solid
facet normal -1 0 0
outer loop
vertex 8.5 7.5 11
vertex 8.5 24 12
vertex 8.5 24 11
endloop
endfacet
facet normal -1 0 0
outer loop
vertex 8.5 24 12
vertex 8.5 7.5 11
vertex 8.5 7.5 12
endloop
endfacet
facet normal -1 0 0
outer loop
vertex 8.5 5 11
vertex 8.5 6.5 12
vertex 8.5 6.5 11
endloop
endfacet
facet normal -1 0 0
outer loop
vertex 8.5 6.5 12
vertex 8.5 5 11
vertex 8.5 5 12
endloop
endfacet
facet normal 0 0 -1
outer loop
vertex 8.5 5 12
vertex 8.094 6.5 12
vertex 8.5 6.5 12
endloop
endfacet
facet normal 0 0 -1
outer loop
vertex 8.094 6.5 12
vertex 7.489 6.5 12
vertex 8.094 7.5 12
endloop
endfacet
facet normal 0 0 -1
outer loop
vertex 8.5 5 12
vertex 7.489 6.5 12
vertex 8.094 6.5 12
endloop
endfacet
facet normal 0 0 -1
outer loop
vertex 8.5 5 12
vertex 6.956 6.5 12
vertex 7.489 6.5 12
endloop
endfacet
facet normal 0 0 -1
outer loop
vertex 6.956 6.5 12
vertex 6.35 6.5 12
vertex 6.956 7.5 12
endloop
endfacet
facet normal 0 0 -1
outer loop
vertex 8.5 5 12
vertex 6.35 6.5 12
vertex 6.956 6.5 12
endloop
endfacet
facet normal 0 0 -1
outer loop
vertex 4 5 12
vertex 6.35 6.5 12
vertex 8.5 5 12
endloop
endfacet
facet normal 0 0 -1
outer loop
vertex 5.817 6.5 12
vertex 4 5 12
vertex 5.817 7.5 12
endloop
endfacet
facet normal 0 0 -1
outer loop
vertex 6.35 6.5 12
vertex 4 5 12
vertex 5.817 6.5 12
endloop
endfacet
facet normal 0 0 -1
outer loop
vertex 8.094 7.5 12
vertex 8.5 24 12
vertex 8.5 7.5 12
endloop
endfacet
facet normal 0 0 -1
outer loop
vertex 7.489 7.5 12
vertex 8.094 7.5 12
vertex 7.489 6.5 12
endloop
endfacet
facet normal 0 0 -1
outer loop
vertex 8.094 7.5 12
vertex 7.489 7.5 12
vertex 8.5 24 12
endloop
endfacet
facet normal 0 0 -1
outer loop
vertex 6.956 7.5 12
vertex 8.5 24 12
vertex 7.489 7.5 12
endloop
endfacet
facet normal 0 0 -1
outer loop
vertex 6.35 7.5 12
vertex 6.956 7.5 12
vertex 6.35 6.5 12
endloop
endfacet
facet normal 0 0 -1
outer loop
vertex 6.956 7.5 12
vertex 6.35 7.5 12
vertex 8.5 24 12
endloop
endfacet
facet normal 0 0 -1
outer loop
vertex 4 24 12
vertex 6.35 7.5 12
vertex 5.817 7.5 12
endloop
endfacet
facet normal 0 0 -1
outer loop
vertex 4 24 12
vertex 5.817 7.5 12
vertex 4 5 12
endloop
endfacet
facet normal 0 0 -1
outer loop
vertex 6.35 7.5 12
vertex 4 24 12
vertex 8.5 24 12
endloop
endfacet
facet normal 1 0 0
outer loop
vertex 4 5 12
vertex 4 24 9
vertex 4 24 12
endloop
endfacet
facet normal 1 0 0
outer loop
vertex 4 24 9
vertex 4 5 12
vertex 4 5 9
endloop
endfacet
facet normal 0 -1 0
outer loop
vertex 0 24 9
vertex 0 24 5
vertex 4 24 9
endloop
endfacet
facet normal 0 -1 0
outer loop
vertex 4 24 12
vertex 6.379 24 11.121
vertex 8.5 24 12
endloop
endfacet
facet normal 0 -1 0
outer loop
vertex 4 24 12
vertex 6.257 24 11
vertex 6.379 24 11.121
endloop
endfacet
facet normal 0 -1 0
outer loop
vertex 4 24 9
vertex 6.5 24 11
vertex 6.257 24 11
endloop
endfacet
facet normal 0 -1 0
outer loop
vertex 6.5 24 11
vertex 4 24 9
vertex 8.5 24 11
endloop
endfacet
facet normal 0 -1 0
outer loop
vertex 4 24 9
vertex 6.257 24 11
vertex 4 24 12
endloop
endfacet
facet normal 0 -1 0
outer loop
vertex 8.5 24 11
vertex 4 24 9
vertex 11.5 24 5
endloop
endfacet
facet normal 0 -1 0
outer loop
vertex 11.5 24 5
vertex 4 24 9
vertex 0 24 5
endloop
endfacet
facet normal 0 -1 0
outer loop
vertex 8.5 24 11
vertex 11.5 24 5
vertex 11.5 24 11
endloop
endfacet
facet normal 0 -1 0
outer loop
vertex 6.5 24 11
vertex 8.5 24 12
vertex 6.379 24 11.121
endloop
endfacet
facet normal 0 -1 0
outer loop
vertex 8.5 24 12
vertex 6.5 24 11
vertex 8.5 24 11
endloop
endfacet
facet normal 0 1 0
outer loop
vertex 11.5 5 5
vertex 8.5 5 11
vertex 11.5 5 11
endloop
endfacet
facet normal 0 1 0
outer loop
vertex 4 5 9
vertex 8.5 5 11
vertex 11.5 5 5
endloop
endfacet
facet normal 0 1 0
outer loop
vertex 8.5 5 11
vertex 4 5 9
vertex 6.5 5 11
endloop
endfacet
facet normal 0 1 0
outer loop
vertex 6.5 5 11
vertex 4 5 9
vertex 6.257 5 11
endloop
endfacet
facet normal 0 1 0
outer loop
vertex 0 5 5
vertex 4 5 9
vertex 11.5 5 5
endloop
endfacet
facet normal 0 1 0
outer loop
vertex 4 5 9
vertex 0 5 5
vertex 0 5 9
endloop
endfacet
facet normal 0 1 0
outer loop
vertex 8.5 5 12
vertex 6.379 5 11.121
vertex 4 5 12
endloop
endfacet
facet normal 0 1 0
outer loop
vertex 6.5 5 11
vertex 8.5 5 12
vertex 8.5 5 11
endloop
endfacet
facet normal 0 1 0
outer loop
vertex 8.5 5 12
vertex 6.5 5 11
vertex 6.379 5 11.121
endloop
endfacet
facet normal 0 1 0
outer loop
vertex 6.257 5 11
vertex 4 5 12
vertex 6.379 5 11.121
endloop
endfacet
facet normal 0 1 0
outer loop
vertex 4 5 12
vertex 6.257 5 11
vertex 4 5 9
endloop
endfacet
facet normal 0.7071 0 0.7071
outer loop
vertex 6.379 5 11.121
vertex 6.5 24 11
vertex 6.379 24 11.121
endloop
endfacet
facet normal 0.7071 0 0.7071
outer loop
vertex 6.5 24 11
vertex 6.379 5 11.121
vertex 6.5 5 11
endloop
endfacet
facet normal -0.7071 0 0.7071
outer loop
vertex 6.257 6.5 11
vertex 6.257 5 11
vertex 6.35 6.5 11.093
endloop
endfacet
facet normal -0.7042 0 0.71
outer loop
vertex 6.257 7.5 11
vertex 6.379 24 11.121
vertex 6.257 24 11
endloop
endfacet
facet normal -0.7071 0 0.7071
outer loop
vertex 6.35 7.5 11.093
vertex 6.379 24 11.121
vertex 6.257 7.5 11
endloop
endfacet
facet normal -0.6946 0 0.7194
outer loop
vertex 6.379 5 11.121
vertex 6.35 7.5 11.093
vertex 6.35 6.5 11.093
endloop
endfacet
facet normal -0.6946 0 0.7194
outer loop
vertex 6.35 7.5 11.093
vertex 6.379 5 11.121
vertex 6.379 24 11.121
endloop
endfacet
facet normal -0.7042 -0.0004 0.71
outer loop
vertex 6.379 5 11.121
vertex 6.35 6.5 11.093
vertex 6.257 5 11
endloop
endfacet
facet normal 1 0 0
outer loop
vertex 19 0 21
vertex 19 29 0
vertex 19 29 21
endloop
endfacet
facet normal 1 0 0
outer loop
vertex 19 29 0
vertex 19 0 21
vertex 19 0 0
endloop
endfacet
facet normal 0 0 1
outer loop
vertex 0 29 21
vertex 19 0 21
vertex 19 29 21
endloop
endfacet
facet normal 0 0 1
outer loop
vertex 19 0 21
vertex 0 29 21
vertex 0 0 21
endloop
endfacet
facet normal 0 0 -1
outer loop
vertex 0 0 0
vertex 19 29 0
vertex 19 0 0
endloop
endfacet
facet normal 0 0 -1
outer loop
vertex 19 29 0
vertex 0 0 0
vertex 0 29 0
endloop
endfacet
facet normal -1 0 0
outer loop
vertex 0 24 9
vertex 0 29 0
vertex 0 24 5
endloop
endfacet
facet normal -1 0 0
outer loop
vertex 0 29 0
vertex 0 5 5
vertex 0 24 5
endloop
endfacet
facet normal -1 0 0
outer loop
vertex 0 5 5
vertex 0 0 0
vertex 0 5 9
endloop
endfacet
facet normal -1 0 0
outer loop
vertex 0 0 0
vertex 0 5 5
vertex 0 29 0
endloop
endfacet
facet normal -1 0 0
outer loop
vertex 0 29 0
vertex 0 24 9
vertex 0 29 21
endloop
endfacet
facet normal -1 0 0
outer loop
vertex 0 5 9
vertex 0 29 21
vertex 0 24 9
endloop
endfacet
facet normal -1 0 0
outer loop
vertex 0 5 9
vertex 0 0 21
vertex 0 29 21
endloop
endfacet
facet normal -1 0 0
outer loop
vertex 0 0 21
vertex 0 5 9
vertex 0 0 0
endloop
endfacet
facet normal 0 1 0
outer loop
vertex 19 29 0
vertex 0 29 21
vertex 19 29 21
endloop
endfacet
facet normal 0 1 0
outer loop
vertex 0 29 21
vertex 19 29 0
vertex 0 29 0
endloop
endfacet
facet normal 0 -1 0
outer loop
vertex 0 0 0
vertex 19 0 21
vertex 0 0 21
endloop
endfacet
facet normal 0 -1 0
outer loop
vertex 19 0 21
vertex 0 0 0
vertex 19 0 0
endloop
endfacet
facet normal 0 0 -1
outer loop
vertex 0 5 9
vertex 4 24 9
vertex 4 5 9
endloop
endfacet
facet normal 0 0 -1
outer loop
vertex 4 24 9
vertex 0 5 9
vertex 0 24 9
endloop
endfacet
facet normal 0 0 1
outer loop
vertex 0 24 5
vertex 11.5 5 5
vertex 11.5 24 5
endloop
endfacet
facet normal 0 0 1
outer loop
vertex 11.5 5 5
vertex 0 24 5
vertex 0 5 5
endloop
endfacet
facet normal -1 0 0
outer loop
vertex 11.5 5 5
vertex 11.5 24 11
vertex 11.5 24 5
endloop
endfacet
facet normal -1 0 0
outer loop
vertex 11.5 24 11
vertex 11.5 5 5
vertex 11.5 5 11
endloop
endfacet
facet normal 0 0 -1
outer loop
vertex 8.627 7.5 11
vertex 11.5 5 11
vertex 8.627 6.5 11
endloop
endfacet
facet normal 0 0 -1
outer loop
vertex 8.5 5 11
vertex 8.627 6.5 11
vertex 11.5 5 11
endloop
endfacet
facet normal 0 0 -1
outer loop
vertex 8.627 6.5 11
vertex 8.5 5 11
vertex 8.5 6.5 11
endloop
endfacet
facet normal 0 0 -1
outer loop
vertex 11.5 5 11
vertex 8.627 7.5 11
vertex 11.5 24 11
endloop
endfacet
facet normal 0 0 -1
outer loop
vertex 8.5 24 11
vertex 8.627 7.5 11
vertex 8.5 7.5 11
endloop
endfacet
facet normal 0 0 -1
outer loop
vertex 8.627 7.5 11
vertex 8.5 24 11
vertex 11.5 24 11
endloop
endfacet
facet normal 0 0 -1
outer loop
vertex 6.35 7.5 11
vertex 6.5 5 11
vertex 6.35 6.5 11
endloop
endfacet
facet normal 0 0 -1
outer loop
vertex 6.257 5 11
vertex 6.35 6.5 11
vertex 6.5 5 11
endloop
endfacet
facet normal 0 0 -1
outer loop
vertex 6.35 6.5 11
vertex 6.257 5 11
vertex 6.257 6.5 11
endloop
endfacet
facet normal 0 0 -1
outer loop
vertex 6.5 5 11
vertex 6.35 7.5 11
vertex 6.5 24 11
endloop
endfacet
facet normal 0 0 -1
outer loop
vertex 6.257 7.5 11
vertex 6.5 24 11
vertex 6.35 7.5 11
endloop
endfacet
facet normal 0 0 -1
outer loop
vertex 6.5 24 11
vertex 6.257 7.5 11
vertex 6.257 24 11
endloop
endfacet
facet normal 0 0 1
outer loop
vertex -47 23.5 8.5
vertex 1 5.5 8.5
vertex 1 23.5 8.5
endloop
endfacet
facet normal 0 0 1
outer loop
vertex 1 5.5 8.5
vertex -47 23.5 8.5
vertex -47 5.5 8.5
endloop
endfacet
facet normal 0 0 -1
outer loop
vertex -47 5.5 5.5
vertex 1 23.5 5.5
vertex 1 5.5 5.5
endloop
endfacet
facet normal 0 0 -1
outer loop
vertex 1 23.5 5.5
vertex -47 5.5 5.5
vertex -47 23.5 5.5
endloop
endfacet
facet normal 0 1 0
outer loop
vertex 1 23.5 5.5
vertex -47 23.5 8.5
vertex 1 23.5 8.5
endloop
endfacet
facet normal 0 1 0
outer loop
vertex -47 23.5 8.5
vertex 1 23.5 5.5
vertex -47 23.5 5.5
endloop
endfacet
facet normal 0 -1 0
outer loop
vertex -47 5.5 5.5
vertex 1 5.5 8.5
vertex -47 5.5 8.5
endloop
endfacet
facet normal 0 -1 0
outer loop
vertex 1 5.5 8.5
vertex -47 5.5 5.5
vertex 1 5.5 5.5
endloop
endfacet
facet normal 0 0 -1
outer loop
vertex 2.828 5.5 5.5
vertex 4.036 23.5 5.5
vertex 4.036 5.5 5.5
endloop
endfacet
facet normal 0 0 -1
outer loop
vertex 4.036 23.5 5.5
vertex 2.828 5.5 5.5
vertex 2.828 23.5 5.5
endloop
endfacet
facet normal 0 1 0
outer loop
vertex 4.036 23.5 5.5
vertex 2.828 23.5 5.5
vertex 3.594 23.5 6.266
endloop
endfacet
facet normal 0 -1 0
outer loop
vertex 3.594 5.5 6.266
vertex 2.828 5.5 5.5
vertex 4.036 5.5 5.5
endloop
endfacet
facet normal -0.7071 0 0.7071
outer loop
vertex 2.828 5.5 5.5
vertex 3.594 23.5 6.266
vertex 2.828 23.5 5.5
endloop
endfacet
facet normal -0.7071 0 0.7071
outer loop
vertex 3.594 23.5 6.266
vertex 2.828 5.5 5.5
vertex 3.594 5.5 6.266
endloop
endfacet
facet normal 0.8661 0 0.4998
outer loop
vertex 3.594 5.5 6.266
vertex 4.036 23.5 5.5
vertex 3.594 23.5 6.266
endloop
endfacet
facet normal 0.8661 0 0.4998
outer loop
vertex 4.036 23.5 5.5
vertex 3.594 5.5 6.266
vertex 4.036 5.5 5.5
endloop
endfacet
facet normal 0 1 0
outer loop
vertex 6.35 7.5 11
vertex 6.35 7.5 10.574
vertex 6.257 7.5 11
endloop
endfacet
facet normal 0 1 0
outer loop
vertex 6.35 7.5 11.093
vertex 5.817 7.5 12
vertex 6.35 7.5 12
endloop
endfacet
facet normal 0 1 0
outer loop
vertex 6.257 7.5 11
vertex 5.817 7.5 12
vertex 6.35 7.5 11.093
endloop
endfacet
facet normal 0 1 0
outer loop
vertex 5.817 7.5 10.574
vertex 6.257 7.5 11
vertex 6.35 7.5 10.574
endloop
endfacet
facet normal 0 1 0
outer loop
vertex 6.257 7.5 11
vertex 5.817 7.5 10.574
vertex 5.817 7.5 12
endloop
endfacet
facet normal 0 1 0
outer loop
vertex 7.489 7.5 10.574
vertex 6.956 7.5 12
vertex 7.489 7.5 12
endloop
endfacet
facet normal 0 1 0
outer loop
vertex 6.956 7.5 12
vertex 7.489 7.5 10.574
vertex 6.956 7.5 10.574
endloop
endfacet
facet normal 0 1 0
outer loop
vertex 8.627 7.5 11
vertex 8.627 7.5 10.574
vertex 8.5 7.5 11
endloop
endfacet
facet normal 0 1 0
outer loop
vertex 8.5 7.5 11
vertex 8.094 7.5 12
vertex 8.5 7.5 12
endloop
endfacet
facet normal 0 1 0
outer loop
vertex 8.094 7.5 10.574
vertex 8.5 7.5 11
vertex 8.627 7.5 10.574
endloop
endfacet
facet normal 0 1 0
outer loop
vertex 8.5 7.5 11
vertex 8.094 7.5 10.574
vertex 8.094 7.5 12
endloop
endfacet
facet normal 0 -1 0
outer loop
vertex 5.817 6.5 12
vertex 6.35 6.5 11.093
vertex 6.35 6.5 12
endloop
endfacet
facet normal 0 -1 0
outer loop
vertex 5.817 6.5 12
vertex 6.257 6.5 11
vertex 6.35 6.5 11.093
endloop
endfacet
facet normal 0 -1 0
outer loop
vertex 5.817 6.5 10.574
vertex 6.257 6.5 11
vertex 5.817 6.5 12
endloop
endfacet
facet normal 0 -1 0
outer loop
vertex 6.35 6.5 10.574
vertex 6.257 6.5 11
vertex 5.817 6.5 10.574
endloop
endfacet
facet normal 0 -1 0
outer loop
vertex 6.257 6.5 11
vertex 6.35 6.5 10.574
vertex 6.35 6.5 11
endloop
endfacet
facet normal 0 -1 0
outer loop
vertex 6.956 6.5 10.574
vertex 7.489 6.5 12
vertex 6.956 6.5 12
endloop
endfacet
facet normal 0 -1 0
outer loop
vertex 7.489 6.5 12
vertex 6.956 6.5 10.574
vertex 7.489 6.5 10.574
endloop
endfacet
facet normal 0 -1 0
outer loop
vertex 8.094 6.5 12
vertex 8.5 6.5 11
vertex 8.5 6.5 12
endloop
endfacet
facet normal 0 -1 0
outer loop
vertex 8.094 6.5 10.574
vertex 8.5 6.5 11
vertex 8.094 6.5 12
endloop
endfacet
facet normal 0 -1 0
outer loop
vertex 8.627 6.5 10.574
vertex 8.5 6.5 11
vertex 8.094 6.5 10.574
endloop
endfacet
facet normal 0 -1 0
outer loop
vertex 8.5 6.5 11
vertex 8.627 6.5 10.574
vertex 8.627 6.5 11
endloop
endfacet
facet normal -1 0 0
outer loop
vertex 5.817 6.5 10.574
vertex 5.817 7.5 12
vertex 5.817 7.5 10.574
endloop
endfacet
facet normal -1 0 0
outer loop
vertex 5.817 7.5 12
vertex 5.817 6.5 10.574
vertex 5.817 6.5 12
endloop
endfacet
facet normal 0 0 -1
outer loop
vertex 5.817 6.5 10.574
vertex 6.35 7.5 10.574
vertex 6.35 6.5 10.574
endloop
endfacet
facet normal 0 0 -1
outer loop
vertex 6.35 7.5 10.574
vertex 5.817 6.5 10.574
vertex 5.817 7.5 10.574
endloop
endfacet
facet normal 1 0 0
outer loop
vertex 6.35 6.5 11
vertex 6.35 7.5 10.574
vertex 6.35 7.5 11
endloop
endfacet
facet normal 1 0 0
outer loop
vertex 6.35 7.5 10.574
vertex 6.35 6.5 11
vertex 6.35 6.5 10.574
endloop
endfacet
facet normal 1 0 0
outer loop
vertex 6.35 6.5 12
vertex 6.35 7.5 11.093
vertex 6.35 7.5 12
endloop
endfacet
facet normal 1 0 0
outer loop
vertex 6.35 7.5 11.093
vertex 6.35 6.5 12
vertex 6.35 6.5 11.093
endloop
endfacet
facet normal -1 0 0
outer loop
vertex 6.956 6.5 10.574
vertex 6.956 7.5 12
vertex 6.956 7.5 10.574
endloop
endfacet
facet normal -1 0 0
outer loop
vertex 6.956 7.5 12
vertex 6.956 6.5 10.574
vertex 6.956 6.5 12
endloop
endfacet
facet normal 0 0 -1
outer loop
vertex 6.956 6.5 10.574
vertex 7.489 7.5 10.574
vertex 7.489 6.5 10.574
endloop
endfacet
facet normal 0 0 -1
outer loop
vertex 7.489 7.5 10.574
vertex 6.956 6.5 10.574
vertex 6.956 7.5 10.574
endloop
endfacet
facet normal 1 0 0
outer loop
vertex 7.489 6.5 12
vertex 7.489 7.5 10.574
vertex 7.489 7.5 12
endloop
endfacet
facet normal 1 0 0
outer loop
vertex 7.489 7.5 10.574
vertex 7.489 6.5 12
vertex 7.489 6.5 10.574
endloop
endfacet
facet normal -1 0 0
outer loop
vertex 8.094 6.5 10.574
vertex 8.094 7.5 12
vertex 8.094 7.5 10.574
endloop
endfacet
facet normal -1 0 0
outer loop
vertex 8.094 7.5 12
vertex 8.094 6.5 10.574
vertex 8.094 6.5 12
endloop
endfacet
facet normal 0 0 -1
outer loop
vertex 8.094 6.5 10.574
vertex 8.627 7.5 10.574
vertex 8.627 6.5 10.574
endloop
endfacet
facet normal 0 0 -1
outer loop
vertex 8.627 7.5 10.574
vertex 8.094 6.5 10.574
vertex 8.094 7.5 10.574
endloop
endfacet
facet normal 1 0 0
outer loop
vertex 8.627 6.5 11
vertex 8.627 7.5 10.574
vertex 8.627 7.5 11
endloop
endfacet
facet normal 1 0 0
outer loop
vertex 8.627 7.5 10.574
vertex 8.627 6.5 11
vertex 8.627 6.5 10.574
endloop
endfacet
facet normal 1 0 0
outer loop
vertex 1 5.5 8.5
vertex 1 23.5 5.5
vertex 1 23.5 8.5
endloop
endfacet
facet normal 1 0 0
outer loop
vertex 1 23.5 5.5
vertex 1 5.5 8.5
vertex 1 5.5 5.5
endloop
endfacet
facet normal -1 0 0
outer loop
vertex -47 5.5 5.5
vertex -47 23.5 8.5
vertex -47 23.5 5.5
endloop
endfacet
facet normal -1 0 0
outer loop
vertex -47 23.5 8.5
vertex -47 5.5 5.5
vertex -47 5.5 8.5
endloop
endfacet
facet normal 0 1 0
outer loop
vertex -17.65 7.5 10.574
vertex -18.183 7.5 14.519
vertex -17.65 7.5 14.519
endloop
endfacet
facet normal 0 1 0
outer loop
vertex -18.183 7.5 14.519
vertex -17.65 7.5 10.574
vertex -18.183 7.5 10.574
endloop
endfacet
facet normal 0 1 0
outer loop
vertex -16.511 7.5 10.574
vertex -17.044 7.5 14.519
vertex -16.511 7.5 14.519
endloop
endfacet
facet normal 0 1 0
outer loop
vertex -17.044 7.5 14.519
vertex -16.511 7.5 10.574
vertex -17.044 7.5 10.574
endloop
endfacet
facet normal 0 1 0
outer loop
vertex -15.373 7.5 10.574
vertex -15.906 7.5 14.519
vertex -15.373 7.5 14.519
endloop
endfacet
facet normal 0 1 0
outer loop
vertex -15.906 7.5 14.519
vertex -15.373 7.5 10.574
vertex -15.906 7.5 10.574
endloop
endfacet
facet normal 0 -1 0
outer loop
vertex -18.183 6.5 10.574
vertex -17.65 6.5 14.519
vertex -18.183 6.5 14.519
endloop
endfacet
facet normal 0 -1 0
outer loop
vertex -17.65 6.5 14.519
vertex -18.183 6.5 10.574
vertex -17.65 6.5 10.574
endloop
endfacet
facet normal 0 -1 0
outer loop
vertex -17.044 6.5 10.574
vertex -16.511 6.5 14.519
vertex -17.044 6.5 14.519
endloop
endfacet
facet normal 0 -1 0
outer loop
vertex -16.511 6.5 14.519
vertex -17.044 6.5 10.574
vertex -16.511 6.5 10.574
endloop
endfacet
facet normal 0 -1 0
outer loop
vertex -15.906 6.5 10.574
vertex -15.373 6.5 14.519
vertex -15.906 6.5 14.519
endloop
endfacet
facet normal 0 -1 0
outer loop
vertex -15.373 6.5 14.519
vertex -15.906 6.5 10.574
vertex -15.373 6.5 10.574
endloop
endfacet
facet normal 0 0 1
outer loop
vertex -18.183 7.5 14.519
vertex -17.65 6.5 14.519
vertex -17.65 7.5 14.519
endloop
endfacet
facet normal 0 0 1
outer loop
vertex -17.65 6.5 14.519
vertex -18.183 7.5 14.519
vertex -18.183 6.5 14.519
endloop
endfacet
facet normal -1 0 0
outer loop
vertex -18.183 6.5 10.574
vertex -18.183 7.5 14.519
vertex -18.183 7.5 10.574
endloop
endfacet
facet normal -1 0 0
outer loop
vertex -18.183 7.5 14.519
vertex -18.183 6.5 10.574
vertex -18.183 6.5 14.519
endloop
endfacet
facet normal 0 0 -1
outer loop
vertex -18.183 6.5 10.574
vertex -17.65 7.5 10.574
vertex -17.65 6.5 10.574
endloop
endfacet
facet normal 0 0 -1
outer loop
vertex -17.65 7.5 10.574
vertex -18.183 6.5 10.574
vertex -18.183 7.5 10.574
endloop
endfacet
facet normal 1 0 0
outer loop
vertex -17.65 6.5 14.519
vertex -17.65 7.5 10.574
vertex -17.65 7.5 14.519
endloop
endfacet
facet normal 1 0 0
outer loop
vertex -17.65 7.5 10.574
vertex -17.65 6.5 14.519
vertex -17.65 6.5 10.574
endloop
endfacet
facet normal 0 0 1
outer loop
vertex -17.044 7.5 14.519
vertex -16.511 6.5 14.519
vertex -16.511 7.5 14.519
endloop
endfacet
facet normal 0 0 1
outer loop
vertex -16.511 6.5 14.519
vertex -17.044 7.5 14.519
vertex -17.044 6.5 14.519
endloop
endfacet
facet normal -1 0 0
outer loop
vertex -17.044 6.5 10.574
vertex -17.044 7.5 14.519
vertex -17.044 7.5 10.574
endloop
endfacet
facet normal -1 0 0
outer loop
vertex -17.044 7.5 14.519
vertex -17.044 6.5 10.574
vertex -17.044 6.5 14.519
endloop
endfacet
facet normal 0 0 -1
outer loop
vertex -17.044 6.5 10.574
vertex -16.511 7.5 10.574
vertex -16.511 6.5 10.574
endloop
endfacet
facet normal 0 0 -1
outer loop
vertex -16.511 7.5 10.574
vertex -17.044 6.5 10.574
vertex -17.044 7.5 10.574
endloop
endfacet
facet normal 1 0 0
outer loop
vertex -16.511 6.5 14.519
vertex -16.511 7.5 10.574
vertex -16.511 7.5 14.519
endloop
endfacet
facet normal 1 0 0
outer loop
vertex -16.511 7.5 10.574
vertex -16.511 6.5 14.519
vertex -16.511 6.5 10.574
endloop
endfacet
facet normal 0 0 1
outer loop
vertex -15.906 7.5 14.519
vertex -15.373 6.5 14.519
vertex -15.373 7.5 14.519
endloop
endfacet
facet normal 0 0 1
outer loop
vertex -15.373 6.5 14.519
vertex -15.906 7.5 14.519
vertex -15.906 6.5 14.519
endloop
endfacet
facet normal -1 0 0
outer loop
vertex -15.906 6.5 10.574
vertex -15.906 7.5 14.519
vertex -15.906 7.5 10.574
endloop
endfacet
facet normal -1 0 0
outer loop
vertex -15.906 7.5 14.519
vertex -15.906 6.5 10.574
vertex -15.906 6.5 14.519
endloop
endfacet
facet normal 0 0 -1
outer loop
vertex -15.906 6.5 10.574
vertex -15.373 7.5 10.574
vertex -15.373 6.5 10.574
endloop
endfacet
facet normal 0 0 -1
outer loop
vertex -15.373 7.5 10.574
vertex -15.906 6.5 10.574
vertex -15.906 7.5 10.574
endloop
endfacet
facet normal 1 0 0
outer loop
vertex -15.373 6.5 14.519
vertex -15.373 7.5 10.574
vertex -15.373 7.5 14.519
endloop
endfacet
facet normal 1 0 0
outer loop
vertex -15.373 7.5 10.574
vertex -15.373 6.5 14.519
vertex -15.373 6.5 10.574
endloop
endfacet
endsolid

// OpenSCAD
// Prototype for a push-fit latching mechanism - V2 (Refined)

// --- Parameters ---
$fn = 64; // Set resolution for curves

// Latch arm properties
latch_arm_length = 22;      // Length of the flexible arm
latch_arm_thickness = 3;     // Thickness of the arm for flexibility and strength
latch_width = 18;            // Width of the latch components

// Latch head properties
latch_head_height = 6;       // Height of the catch
latch_head_overhang = 2.5;   // Overhang of the catch to lock it in place
latch_release_angle = 30;    // Angle of the release surface
latch_insertion_angle = 45;  // Angle of the insertion ramp for smooth engagement

// Receptacle properties
receptacle_wall_thickness = 4; // Thickness of the wall where the receptacle is
receptacle_clearance = 0.5;  // Clearance for the latch arm to move freely

// --- Latch Module (to be integrated into the control box) ---
module latch() {
    union() {
        // Base of the latch arm with a fillet for stress relief
        difference() {
            cube([5, latch_width, latch_arm_thickness]);
            translate([5, -1, -1])
            rotate([0, 90, 0])
            cylinder(r=2, h=latch_width+2);
        }

        // The flexible arm
        translate([2, 0, 0])
        cube([latch_arm_length, latch_width, latch_arm_thickness]);

        // The latching head with improved geometry
        translate([latch_arm_length + 2, 0, 0]) {
            difference() {
                // Main body of the head
                cube([latch_head_overhang + 4, latch_width, latch_head_height]);

                // Angled surface for smooth insertion (insertion ramp)
                translate([-1, -1, 0])
                rotate([0, latch_insertion_angle, 0])
                translate([-latch_head_height, 0, 0])
                cube([latch_head_height + 2, latch_width + 2, latch_head_height + 2]);

                // Angled surface for easy release
                translate([latch_head_overhang + 4, -1, latch_head_height])
                rotate([0, -latch_release_angle, 0])
                translate([-latch_head_height, 0, -latch_head_height])
                cube([latch_head_height + 2, latch_width + 2, latch_head_height + 2]);
            }

            // Add a textured grip for release
            translate([latch_head_overhang + 2, 2, latch_head_height])
            rotate([90,0,0])
            linear_extrude(height=1)
            text("|||", size=3, font="Liberation Sans:style=Bold");
        }
    }
}

// --- Receptacle Module (to be integrated into the trap tube) ---
module receptacle() {
    receptacle_opening_width = latch_width + 2 * receptacle_clearance;
    receptacle_opening_height = latch_arm_thickness + 2 * receptacle_clearance;
    catch_lip_height = latch_head_height - latch_arm_thickness;

    difference() {
        // A block representing part of the main tube wall
        cube([receptacle_wall_thickness + 15, receptacle_opening_width + 10, latch_head_height + 15]);

        // The cutout for the latch arm to pass through
        translate([-1, 5, 5])
        cube([receptacle_wall_thickness + 2, receptacle_opening_width, receptacle_opening_height]);

        // The cavity for the latch head
        translate([receptacle_wall_thickness, 5, 5])
        cube([latch_head_overhang + 5, receptacle_opening_width, latch_head_height]);

        // Create the catch lip
        translate([receptacle_wall_thickness, 5, 5 + receptacle_opening_height])
        difference() {
            cube([latch_head_overhang + 2, receptacle_opening_width, catch_lip_height]);
            // Chamfer on the catch for better engagement
            translate([latch_head_overhang+2, 0, 0])
            rotate([0,-45,0])
            translate([-catch_lip_height,0,0])
            cube([catch_lip_height, receptacle_opening_width, catch_lip_height]);
        }
    }
}


// --- Assembly for Visualization ---
// This shows how the two parts will interact.

// Receptacle (on the main tube)
color("royalblue")
receptacle();

// Latch (on the control box), positioned to show engagement
color("tomato")
translate([-latch_arm_length-1, 5 + receptacle_clearance, 5 + receptacle_clearance])
latch();

// A second view showing the unlatched state
color("lightsalmon")
translate([-latch_arm_length - 25, 5 + receptacle_clearance, 5 + receptacle_clearance])
latch();
